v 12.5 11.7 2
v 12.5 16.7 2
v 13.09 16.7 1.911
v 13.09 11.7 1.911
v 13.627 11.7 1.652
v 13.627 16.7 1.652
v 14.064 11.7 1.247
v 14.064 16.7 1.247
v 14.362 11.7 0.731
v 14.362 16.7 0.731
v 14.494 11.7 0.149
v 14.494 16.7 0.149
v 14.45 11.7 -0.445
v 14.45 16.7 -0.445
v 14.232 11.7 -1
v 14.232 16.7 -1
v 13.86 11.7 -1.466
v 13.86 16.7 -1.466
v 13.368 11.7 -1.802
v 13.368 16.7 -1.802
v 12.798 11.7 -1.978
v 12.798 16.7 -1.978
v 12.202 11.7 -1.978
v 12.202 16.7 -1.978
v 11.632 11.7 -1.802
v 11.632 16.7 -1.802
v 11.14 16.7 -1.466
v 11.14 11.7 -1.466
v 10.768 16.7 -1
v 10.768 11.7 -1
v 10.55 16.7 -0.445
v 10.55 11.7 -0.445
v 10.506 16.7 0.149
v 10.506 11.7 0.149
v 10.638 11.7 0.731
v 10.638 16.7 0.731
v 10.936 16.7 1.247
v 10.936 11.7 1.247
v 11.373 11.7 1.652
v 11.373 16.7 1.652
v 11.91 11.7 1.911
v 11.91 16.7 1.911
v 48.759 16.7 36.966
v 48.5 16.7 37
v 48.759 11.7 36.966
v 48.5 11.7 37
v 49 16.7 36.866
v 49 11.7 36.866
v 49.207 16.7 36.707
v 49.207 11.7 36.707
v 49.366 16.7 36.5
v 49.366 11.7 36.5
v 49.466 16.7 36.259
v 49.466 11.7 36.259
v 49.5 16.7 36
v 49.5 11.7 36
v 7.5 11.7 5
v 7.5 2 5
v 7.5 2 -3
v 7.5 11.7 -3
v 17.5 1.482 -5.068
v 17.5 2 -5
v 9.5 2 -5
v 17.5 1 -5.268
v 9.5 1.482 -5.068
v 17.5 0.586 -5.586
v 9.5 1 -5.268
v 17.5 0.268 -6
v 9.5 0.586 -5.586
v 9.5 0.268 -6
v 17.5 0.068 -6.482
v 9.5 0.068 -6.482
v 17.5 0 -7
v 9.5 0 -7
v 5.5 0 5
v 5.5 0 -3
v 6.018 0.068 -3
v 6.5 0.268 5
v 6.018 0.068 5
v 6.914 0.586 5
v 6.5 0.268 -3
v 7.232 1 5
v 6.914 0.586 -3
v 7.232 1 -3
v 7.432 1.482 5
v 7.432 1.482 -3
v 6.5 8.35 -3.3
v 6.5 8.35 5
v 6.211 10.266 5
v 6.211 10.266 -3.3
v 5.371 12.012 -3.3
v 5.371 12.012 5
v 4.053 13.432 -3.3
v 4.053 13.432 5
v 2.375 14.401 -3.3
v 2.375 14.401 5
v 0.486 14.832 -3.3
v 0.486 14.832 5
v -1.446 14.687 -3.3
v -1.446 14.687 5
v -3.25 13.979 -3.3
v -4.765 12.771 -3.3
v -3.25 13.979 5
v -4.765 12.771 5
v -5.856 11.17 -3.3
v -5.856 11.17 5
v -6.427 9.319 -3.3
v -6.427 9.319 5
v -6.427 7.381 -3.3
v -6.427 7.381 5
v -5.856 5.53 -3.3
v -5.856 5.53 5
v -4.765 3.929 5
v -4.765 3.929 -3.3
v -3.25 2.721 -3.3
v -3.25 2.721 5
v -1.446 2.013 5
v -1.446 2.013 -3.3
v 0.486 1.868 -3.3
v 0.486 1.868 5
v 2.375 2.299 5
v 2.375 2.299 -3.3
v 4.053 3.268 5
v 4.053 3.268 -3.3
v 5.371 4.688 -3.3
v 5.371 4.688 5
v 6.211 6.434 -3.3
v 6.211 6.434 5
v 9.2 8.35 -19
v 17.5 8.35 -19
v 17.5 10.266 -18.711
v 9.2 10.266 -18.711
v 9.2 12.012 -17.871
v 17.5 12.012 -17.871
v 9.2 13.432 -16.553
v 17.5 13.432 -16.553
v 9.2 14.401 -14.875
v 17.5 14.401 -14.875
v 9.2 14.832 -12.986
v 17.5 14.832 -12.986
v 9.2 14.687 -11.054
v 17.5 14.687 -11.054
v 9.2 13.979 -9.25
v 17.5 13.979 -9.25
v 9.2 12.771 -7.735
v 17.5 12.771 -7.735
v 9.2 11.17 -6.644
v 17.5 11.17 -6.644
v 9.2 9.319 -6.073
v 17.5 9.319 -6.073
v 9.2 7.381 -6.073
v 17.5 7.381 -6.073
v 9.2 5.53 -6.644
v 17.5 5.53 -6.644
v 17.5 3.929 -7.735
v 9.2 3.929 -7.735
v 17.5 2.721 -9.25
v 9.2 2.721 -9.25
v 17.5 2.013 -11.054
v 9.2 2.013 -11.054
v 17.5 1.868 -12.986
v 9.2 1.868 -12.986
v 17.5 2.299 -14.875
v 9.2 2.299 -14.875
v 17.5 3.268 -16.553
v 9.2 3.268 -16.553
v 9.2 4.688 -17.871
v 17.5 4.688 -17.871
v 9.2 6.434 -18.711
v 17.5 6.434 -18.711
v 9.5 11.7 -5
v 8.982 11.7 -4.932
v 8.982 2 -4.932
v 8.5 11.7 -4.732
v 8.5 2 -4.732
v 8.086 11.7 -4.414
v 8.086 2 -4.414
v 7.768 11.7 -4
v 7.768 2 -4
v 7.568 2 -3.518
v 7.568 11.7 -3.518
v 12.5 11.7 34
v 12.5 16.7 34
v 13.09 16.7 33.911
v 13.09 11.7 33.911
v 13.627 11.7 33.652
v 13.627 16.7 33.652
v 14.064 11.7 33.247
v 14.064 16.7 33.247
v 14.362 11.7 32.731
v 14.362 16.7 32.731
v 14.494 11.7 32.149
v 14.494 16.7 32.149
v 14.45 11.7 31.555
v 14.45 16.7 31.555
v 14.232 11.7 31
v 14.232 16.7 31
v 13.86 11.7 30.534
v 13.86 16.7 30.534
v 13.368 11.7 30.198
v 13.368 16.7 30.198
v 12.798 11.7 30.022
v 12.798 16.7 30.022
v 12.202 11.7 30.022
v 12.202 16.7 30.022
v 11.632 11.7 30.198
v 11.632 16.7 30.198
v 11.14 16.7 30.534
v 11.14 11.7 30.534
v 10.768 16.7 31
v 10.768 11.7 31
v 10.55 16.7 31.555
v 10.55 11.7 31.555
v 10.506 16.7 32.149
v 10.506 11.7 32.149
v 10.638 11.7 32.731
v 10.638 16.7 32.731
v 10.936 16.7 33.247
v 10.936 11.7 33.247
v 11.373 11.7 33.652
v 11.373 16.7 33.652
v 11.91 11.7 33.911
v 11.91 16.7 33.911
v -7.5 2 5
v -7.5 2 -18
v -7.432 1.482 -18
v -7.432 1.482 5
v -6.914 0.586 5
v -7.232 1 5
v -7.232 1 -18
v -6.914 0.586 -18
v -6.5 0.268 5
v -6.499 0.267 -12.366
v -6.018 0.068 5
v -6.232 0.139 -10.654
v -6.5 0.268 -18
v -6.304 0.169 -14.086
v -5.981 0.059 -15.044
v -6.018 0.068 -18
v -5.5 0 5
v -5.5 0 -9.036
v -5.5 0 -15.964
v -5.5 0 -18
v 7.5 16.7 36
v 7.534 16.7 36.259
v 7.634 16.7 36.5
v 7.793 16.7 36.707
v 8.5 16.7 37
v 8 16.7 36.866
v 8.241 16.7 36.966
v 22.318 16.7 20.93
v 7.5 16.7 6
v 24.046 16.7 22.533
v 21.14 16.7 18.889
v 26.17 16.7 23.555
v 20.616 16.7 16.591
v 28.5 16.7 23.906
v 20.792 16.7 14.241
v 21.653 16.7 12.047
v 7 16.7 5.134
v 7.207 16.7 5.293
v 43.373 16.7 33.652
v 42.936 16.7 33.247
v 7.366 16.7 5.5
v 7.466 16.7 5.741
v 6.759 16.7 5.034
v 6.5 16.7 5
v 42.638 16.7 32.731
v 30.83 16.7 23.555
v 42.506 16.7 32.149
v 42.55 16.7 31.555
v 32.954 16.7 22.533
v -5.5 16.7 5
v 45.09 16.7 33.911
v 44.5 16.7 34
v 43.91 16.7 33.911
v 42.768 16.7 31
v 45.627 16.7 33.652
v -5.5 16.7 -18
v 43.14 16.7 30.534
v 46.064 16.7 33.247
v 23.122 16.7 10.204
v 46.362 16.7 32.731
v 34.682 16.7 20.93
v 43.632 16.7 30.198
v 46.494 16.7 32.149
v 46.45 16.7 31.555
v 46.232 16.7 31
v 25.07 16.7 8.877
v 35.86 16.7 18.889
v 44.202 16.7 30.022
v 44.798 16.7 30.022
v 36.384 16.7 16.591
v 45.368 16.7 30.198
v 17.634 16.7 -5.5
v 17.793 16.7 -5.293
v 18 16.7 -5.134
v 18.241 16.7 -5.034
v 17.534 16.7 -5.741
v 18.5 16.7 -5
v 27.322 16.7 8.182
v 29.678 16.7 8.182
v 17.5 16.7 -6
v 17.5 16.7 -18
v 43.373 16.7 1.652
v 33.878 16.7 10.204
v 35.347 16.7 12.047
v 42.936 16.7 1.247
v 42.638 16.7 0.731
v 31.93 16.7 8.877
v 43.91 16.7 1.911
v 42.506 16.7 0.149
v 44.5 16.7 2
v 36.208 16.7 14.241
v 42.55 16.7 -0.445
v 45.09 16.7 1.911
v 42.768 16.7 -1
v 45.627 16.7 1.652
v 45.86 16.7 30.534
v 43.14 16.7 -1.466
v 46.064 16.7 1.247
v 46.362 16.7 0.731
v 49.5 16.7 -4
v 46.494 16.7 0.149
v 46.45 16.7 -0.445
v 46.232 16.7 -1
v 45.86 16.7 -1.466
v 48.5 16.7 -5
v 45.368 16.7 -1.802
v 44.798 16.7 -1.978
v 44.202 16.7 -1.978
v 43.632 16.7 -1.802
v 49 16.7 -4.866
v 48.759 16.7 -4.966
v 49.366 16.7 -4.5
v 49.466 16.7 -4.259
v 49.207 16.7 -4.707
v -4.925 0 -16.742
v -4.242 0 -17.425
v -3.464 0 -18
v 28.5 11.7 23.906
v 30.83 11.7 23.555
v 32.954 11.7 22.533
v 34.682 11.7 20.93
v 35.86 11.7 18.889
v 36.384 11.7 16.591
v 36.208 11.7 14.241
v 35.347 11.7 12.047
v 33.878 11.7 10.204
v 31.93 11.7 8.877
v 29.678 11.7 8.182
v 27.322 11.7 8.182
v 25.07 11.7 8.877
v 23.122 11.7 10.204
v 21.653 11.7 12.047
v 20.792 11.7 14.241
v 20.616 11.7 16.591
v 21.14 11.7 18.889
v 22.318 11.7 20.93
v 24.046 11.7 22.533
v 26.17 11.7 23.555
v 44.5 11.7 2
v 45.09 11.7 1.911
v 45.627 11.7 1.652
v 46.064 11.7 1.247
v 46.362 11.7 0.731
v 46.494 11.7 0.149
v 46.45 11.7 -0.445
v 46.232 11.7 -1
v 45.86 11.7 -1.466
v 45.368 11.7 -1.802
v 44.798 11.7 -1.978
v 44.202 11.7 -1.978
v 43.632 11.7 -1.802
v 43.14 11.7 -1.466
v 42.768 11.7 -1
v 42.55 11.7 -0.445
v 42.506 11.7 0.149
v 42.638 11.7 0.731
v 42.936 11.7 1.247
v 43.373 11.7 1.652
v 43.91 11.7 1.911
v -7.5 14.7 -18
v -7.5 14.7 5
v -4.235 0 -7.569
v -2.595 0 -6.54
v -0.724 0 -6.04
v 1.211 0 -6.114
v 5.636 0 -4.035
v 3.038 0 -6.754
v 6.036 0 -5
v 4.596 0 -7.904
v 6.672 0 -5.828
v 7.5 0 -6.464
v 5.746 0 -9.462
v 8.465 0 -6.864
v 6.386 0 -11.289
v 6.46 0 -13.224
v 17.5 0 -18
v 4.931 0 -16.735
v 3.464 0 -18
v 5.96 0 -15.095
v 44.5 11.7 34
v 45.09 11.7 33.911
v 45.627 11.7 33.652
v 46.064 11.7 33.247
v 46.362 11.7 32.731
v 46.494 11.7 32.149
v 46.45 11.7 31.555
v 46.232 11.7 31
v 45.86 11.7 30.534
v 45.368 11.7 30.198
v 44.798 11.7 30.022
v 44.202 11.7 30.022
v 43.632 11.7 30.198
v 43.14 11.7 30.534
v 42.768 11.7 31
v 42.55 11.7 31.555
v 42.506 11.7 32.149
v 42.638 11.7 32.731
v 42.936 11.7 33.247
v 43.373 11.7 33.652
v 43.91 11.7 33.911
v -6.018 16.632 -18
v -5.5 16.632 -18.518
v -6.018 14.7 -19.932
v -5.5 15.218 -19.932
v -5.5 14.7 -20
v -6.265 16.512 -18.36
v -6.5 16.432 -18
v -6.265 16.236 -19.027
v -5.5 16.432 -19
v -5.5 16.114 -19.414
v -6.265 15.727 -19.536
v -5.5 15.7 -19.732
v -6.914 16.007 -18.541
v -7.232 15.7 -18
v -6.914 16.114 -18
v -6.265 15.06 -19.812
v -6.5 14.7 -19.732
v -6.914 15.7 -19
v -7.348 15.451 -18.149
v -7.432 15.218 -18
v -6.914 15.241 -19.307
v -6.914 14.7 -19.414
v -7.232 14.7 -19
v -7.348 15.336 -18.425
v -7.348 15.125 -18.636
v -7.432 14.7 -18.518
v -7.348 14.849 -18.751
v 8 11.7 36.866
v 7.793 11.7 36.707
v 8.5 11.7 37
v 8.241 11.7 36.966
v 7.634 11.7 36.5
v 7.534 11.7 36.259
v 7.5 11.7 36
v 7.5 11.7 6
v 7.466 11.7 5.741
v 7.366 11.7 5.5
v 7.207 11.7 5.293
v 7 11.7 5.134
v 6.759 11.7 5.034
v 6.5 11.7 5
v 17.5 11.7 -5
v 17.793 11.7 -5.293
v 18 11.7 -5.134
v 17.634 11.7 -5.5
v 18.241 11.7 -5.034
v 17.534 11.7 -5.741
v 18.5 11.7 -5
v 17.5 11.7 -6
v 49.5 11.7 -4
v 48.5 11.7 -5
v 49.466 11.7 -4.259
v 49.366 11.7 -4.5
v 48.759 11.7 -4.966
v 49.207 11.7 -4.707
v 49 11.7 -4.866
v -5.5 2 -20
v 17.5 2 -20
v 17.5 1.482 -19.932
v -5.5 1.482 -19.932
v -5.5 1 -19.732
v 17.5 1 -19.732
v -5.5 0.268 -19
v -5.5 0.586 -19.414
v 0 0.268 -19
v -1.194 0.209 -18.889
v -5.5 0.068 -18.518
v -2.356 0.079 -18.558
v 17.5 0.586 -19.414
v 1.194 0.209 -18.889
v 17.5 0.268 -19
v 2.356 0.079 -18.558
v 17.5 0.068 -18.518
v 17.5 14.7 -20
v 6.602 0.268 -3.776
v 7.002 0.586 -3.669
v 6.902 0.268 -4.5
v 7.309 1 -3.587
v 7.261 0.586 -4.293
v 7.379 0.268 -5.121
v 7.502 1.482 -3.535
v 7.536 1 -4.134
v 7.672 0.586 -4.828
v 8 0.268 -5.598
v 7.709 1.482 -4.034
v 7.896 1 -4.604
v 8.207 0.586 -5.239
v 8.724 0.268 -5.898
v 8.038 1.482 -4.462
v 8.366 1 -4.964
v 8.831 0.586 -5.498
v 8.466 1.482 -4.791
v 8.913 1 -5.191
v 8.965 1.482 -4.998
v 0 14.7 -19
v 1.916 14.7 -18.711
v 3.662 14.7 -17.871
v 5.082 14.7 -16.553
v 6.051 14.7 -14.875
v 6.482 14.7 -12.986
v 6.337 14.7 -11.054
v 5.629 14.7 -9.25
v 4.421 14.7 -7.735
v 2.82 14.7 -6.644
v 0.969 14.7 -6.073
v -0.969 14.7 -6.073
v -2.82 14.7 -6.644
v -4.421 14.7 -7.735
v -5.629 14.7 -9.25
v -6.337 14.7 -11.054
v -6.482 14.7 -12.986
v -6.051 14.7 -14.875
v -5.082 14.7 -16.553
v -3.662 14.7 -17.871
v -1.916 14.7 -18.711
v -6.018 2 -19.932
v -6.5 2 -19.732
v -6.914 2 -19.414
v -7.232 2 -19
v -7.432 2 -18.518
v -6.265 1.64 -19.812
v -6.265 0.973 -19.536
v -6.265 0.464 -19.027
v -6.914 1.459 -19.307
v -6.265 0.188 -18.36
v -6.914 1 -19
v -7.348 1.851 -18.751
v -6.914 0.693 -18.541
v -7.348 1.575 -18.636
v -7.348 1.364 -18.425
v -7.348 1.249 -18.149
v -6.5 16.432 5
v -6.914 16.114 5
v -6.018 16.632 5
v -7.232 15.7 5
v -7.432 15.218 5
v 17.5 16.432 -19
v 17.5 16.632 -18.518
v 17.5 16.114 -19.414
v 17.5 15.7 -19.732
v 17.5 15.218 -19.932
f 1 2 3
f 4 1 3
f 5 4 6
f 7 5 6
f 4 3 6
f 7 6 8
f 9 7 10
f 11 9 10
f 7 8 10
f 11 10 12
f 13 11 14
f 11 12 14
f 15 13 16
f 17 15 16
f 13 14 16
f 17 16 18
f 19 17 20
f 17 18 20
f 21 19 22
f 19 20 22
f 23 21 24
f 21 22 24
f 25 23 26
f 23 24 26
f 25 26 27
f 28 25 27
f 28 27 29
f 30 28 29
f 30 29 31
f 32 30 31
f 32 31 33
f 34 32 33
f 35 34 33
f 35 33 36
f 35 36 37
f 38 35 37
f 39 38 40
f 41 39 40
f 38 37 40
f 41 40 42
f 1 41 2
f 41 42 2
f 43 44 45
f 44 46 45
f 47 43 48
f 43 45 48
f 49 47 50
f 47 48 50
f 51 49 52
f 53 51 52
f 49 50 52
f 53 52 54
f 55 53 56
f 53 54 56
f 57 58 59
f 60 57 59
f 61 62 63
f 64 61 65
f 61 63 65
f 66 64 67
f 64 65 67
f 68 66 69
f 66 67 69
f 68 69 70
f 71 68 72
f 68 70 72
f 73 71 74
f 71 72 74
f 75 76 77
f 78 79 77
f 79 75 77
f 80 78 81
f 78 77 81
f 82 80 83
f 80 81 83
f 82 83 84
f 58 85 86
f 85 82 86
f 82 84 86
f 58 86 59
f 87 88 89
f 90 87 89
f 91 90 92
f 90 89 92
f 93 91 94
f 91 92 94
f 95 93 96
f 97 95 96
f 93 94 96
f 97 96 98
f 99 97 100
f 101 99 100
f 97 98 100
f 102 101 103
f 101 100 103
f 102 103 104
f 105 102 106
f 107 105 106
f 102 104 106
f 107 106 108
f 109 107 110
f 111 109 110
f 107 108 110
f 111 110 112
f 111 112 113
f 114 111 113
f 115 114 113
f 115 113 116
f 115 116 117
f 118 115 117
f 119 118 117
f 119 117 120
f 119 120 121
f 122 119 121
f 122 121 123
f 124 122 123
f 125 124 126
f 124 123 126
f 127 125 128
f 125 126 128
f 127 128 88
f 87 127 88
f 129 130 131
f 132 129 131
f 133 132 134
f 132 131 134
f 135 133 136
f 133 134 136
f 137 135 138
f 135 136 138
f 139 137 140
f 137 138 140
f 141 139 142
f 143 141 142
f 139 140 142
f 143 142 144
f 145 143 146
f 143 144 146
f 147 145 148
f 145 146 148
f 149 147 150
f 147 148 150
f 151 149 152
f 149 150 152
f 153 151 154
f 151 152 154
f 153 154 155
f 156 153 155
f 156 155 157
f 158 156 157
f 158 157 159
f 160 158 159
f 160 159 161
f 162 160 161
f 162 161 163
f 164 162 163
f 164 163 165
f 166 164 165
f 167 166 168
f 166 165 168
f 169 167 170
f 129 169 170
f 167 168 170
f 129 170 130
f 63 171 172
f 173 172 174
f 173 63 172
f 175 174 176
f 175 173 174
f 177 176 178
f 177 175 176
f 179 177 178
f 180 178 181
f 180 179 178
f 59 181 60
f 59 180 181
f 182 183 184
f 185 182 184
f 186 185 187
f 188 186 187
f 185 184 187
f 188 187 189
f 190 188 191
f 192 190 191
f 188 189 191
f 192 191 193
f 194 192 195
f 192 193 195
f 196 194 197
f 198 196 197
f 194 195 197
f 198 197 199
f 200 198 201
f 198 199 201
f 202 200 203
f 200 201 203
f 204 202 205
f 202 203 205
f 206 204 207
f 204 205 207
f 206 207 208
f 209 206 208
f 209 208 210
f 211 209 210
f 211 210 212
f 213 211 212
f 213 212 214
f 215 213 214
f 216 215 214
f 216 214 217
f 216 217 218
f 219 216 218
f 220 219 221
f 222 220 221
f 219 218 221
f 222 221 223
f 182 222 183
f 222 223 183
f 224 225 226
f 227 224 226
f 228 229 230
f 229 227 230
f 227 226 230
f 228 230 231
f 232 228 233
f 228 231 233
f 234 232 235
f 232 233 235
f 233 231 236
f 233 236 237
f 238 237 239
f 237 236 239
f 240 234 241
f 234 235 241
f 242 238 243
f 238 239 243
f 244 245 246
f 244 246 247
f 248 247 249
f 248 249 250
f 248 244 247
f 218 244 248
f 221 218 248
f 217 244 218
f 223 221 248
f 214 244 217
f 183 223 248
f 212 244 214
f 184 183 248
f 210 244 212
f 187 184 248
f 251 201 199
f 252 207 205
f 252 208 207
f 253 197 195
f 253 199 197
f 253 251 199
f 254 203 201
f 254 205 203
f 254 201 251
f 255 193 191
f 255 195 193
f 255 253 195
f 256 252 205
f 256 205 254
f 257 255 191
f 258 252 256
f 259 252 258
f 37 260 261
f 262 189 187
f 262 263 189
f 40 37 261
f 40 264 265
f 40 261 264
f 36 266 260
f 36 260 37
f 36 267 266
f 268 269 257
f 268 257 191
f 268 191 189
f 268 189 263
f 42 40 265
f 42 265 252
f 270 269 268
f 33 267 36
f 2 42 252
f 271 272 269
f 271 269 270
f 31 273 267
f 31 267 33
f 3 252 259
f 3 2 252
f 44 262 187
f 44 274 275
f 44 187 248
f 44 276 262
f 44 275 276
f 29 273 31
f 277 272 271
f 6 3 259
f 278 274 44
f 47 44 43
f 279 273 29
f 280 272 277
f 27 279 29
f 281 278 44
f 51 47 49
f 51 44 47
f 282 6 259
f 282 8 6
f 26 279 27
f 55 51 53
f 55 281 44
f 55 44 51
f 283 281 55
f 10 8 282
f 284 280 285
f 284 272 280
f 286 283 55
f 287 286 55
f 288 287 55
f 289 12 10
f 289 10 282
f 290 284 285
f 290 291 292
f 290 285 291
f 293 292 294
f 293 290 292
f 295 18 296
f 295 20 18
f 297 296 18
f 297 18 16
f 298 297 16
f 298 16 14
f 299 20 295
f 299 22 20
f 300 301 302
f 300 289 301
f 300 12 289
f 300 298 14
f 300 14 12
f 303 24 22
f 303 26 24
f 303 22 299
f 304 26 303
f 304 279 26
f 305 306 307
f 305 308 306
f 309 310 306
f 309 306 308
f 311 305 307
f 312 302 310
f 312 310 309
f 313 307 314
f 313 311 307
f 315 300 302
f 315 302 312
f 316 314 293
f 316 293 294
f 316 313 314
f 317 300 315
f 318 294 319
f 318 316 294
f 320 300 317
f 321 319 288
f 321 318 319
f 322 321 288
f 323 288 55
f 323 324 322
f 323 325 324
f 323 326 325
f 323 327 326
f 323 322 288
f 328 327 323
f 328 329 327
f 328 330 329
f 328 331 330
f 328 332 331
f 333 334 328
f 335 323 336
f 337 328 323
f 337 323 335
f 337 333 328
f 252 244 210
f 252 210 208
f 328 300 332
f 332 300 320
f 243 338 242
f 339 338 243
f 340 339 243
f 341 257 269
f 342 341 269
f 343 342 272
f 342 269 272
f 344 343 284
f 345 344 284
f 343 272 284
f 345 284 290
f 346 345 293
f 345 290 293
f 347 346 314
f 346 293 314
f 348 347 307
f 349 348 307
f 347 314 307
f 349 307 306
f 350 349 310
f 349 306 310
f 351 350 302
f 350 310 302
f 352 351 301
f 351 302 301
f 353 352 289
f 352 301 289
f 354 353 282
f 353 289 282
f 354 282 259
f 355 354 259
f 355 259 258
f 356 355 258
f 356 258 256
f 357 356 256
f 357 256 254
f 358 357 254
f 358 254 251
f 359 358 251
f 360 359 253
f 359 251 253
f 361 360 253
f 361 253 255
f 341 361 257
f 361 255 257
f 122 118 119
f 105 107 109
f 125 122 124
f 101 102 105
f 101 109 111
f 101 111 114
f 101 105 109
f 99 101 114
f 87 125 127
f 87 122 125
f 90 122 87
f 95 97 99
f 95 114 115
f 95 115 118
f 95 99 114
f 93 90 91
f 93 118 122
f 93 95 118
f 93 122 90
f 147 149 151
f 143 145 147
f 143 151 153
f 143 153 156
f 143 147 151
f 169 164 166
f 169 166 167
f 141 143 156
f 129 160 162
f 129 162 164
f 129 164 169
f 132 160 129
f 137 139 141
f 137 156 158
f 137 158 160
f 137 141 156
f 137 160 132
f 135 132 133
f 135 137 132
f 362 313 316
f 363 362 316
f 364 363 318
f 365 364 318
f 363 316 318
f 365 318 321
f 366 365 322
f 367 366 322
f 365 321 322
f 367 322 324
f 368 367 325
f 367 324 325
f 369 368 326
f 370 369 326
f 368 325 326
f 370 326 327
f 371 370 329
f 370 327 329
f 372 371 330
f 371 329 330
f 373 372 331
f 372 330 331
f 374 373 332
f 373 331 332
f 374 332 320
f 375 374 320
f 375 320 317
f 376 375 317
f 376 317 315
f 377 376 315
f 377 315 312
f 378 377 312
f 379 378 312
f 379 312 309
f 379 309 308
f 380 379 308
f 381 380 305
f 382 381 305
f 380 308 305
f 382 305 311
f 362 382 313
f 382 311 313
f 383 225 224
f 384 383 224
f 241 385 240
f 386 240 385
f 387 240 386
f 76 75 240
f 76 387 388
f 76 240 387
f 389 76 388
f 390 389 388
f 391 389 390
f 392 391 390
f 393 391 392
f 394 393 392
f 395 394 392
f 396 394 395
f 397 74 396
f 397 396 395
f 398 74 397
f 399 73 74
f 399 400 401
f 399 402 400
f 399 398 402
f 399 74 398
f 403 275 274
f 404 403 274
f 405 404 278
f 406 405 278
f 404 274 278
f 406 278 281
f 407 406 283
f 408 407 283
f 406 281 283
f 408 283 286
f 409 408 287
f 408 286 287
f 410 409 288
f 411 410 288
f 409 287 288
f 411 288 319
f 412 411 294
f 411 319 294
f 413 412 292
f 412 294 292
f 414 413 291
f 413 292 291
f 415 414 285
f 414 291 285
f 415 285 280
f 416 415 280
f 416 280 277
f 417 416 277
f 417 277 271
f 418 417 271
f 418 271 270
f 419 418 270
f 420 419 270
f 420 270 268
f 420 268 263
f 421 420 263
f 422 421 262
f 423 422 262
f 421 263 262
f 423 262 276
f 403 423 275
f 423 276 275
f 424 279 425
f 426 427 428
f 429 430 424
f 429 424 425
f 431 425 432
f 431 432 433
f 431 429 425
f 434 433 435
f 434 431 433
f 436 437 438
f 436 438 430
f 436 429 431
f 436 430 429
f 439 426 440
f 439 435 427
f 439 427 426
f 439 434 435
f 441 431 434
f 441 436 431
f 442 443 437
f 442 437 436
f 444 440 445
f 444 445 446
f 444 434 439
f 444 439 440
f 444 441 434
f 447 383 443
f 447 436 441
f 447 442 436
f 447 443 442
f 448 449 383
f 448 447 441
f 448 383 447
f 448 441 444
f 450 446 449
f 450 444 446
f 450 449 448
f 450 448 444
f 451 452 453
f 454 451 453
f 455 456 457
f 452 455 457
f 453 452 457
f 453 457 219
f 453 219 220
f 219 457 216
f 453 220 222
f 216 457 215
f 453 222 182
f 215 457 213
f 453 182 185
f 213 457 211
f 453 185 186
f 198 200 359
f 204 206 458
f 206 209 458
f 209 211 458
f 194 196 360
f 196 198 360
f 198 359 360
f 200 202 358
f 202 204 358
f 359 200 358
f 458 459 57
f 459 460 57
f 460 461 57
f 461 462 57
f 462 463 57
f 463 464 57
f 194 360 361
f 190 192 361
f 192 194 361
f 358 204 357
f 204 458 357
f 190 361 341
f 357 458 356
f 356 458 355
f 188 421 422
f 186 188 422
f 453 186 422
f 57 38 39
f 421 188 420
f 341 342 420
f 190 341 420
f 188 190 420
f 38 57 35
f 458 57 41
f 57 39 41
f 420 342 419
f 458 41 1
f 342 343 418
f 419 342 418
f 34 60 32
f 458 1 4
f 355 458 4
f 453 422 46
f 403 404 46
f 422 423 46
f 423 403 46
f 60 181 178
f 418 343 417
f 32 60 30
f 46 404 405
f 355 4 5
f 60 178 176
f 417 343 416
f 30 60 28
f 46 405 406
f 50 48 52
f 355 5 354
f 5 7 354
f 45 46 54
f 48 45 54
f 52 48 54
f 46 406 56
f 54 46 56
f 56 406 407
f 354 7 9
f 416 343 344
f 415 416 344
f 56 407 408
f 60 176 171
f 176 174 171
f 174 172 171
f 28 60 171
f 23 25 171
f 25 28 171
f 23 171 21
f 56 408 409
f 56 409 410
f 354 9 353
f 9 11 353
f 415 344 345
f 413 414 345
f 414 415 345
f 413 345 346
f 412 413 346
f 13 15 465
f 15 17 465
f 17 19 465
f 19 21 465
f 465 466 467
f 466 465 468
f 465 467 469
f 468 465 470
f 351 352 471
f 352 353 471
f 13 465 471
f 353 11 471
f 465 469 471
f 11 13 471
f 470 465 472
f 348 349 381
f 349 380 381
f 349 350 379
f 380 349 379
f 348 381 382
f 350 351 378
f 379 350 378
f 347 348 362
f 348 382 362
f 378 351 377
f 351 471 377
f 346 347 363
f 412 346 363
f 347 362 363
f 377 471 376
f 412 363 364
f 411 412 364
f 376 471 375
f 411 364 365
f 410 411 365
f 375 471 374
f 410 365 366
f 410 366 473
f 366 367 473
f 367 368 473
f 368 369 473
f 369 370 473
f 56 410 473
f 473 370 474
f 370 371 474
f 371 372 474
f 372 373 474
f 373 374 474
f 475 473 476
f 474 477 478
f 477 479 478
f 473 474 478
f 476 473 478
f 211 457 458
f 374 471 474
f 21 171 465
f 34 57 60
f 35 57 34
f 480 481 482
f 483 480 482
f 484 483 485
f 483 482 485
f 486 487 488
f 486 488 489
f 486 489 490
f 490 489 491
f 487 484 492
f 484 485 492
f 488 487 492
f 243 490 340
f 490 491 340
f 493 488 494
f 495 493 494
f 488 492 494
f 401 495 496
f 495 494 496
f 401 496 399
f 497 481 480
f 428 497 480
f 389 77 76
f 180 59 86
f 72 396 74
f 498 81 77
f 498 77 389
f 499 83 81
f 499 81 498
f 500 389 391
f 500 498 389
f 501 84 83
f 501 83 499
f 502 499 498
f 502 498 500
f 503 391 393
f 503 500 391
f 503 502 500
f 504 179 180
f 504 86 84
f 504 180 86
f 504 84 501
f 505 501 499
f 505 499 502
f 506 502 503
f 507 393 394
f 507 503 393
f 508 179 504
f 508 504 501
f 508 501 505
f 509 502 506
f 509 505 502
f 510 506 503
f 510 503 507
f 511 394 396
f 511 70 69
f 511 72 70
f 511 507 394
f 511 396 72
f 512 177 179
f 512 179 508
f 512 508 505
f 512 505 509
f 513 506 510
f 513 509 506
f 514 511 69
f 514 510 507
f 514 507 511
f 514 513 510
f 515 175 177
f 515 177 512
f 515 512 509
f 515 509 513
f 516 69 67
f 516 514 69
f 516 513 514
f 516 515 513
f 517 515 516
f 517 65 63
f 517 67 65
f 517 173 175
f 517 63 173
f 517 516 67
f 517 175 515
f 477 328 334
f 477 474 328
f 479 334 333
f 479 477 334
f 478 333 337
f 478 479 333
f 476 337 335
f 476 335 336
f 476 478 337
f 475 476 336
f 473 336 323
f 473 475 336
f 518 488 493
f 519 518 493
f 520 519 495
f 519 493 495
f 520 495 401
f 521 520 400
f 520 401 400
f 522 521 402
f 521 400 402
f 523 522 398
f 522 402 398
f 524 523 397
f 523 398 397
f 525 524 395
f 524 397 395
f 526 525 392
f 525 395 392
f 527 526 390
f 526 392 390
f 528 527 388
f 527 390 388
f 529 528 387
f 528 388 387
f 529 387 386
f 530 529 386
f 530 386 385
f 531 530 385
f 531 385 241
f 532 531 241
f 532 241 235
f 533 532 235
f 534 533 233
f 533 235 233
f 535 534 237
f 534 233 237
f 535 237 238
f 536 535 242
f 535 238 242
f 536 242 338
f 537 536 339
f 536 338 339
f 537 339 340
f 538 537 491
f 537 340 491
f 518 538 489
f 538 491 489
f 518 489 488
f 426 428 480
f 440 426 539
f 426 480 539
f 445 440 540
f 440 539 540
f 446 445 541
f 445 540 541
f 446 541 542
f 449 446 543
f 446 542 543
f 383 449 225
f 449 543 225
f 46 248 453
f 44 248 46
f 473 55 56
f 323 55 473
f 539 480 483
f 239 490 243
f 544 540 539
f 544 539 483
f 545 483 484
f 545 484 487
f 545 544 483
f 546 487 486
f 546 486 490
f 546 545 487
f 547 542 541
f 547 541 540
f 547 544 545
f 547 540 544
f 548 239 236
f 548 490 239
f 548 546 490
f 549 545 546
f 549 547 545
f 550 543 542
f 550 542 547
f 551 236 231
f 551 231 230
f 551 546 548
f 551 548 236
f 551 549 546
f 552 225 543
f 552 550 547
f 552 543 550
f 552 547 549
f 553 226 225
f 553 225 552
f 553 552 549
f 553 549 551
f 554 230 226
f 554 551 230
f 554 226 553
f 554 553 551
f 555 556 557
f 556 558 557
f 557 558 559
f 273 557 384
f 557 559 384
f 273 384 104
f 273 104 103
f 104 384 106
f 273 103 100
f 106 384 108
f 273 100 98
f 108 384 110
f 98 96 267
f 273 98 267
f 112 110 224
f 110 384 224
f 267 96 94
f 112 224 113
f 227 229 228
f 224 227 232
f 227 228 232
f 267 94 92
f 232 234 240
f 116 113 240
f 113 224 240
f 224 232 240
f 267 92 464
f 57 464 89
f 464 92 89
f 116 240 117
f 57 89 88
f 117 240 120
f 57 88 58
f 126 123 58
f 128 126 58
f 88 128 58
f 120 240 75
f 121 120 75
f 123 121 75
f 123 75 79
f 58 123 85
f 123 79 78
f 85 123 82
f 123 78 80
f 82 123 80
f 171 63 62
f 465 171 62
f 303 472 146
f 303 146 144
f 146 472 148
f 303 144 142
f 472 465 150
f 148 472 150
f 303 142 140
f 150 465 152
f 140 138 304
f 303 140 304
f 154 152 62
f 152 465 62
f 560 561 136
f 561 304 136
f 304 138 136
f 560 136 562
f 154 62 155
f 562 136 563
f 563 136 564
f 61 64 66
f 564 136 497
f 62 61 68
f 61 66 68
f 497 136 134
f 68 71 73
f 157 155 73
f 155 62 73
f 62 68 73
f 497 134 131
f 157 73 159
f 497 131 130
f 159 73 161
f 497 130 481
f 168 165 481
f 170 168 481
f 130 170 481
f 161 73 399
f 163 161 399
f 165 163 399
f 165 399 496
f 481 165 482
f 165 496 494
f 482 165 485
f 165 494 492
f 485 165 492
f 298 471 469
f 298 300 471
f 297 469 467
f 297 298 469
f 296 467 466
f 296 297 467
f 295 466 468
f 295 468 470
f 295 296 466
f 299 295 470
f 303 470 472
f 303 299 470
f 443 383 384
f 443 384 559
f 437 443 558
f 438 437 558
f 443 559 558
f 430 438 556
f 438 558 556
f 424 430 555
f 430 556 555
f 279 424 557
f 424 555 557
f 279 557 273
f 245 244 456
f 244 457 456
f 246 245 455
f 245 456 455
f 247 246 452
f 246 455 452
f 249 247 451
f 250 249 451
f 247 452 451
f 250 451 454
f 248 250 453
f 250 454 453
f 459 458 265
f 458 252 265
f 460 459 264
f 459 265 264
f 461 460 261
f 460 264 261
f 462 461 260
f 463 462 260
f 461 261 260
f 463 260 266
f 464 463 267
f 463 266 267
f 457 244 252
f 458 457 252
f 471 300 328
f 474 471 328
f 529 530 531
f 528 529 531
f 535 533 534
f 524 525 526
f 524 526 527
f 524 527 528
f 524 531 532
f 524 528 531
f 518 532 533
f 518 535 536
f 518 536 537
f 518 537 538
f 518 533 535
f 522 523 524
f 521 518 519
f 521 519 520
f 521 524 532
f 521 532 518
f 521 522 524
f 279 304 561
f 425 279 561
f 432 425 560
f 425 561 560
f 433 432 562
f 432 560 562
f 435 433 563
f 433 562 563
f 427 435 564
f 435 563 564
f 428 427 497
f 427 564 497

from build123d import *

# Parameters (mm, degrees)
SKETCH1_W           = 15
SKETCH1_H           = 10
SKETCH1_H_2         = 15
SKETCH1_W_2         = 10
BOSS_EXTRUDE1_DEPTH = 16.7
SKETCH2_R           = 6.5
CUT_EXTRUDE1_DEPTH  = 8.3
SKETCH3_R           = 6.5
CUT_EXTRUDE2_DEPTH  = 8.3
SKETCH4_R           = 6.5
CUT_EXTRUDE3_DEPTH  = 14.7
FILLET8_R           = 2
SKETCH5_W           = 42
SKETCH5_H           = 42
SKETCH5_R           = 2
SKETCH5_R_2         = 7.906463766
BOSS_EXTRUDE3_DEPTH = 5
FILLET9_R           = 1


with BuildPart() as part:
    # Sketch1 → Boss-Extrude1 (new body)
    with BuildSketch(Plane(origin=(0, 0, 0), x_dir=(1, 0, 0), z_dir=(0, 1, 0))):
        Rectangle(SKETCH1_W, SKETCH1_H)
        with Locations((0, 12.5)):
            Rectangle(SKETCH1_W, SKETCH1_H_2)
        with Locations((12.5, 12.5)):
            Rectangle(SKETCH1_W_2, SKETCH1_H_2)
    extrude(amount=BOSS_EXTRUDE1_DEPTH)

    # Sketch2 → Cut-Extrude1 (cut)
    with BuildSketch(Plane.XY.offset(5)):
        with Locations((0, 8.35)):
            Circle(SKETCH2_R)
    extrude(amount=-CUT_EXTRUDE1_DEPTH, mode=Mode.SUBTRACT)

    # Sketch3 → Cut-Extrude2 (cut)
    with BuildSketch(Plane(origin=(17.5, 0, 0), x_dir=(0, 0, -1), z_dir=(1, 0, 0))):
        with Locations((12.5, 8.35)):
            Circle(SKETCH3_R)
    extrude(amount=-CUT_EXTRUDE2_DEPTH, mode=Mode.SUBTRACT)

    # Sketch4 → Cut-Extrude3 (cut)
    with BuildSketch(Plane.XZ):
        with Locations(Location((0, -12.5, 0), (0, 0, 270))):
            Circle(SKETCH4_R)
    extrude(amount=-CUT_EXTRUDE3_DEPTH, mode=Mode.SUBTRACT)

    # Fillet8
    # the kernel refuses this fillet: 2 mm, written as the material it adds along each edge
    with BuildSketch(Plane(origin=(7.5, 0, -5), x_dir=(0, 0, 1), z_dir=(0, 1, 0))) as fillet8_piece_1:
        with BuildLine():
            CenterArc((FILLET8_R, FILLET8_R), FILLET8_R, 180, 90)
            Line((0, FILLET8_R), (0, 0))
            Line((0, 0), (FILLET8_R, 0))
        make_face()
    extrude(amount=16.7)
    # the kernel refuses this fillet: 2 mm, written as the material it takes off along each edge
    with BuildSketch(Plane(origin=(-5.5, 2, -18), x_dir=(0, 0, -1), z_dir=(-1, 0, 0))) as fillet8_2_piece_1_section:
        Polygon((0, 0), (FILLET8_R, 0), (FILLET8_R, FILLET8_R), (0, FILLET8_R), align=None)
    fillet8_2_piece_1 = extrude(amount=FILLET8_R, mode=Mode.PRIVATE)
    fillet8_2_piece_1 = fillet8_2_piece_1 - Plane(origin=(-5.5, 2, -18), x_dir=(0, 0.7071067811865475, 0.7071067811865475), z_dir=(-1, 0, 0)) * Sphere(FILLET8_R, mode=Mode.PRIVATE)
    add(fillet8_2_piece_1, mode=Mode.SUBTRACT)
    with BuildSketch(Plane(origin=(-5.5, 14.7, -18), x_dir=(0, 1, 0), z_dir=(-1, 0, 0))) as fillet8_2_piece_2_section:
        Polygon((0, 0), (FILLET8_R, 0), (FILLET8_R, FILLET8_R), (0, FILLET8_R), align=None)
    fillet8_2_piece_2 = extrude(amount=FILLET8_R, mode=Mode.PRIVATE)
    fillet8_2_piece_2 = fillet8_2_piece_2 - Plane(origin=(-5.5, 14.7, -18), x_dir=(0, -0.7071067811865475, 0.7071067811865475), z_dir=(-1, 0, 0)) * Sphere(FILLET8_R, mode=Mode.PRIVATE)
    add(fillet8_2_piece_2, mode=Mode.SUBTRACT)
    with BuildSketch(Plane(origin=(-7.5, 0, -18), x_dir=(0, 1, 0), z_dir=(0, 0, 1)), Plane(origin=(22.5, 16.7, -20), x_dir=(0, 0, 1), z_dir=(-1, 0, 0)), Plane(origin=(-7.5, 16.7, 10), x_dir=(0, -1, 0), z_dir=(0, 0, -1)), Plane(origin=(22.5, 0, -20), x_dir=(0, 1, 0), z_dir=(-1, 0, 0))) as fillet8_2_piece_3:
        with BuildLine():
            CenterArc((FILLET8_R, -FILLET8_R), FILLET8_R, 90, 90)
            Line((0, -FILLET8_R), (0, 0))
            Line((0, 0), (FILLET8_R, 0))
        make_face()
    extrude(amount=28, mode=Mode.SUBTRACT)
    with BuildSketch(Plane(origin=(-7.5, 2, -20), x_dir=(0, 0, 1), z_dir=(0, 1, 0))) as fillet8_2_piece_4:
        with BuildLine():
            CenterArc((FILLET8_R, FILLET8_R), FILLET8_R, 180, 90)
            Line((0, FILLET8_R), (0, 0))
            Line((0, 0), (FILLET8_R, 0))
        make_face()
    extrude(amount=12.7, mode=Mode.SUBTRACT)
    # the kernel refuses this fillet: 2 mm, written as the material it takes off along each edge
    with BuildSketch(Plane(origin=(9.5, 0, -5), x_dir=(0, 0, -1), z_dir=(1, 0, 0))) as fillet8_3_piece_1:
        with BuildLine():
            CenterArc((FILLET8_R, FILLET8_R), FILLET8_R, 180, 90)
            Line((0, FILLET8_R), (0, 0))
            Line((0, 0), (FILLET8_R, 0))
        make_face()
    extrude(amount=13, mode=Mode.SUBTRACT)
    with BuildSketch(Plane(origin=(7.5, 0, -3), x_dir=(-1, 0, 0), z_dir=(0, 0, 1))) as fillet8_3_piece_2:
        with BuildLine():
            CenterArc((FILLET8_R, -FILLET8_R), FILLET8_R, 90, 90)
            Line((0, -FILLET8_R), (0, 0))
            Line((0, 0), (FILLET8_R, 0))
        make_face()
    extrude(amount=13, mode=Mode.SUBTRACT)
    with BuildSketch(Plane(origin=(9.5, 0, -3), x_dir=(-1, 0, 0), z_dir=(0, 0, 1))) as fillet8_3_piece_3:
        with BuildLine():
            CenterArc((2 + FILLET8_R, -FILLET8_R), FILLET8_R, 90, 90)
            Line((2, -FILLET8_R), (2, 0))
            Line((2, 0), (2 + FILLET8_R, 0))
        make_face()
    revolve(axis=Axis((9.5, 0, -3), (0, -1, 0)), revolution_arc=90, mode=Mode.SUBTRACT)

    # Sketch5 → Boss-Extrude3 (add)
    with BuildSketch(Plane(origin=(0, 16.7, 0), x_dir=(1, 0, 0), z_dir=(0, 1, 0))):
        with Locations((28.5, -16)):
            Rectangle(SKETCH5_W, SKETCH5_H)
        with Locations(Location((12.5, 0, 0), (0, 0, 270))):
            Circle(SKETCH5_R, mode=Mode.SUBTRACT)
        with Locations(Location((12.5, -32, 0), (0, 0, 270))):
            Circle(SKETCH5_R, mode=Mode.SUBTRACT)
        with Locations(Location((44.5, -32, 0), (0, 0, 270))):
            Circle(SKETCH5_R, mode=Mode.SUBTRACT)
        with Locations(Location((44.5, 0, 0), (0, 0, 270))):
            Circle(SKETCH5_R, mode=Mode.SUBTRACT)
        with Locations(Location((28.5, -16, 0), (0, 0, 270))):
            Circle(SKETCH5_R_2, mode=Mode.SUBTRACT)
    extrude(amount=-BOSS_EXTRUDE3_DEPTH)

    # Fillet9
    fillet9_edges = [part.edges().sort_by_distance(p)[0] for p in [
        (17.5, 14.2, -5),
        (7.5, 14.2, 5),
        (49.5, 14.2, 37),
        (7.5, 14.2, 37),
        (49.5, 14.2, -5),
    ]]
    fillet(fillet9_edges, radius=FILLET9_R)


solid = part.part
